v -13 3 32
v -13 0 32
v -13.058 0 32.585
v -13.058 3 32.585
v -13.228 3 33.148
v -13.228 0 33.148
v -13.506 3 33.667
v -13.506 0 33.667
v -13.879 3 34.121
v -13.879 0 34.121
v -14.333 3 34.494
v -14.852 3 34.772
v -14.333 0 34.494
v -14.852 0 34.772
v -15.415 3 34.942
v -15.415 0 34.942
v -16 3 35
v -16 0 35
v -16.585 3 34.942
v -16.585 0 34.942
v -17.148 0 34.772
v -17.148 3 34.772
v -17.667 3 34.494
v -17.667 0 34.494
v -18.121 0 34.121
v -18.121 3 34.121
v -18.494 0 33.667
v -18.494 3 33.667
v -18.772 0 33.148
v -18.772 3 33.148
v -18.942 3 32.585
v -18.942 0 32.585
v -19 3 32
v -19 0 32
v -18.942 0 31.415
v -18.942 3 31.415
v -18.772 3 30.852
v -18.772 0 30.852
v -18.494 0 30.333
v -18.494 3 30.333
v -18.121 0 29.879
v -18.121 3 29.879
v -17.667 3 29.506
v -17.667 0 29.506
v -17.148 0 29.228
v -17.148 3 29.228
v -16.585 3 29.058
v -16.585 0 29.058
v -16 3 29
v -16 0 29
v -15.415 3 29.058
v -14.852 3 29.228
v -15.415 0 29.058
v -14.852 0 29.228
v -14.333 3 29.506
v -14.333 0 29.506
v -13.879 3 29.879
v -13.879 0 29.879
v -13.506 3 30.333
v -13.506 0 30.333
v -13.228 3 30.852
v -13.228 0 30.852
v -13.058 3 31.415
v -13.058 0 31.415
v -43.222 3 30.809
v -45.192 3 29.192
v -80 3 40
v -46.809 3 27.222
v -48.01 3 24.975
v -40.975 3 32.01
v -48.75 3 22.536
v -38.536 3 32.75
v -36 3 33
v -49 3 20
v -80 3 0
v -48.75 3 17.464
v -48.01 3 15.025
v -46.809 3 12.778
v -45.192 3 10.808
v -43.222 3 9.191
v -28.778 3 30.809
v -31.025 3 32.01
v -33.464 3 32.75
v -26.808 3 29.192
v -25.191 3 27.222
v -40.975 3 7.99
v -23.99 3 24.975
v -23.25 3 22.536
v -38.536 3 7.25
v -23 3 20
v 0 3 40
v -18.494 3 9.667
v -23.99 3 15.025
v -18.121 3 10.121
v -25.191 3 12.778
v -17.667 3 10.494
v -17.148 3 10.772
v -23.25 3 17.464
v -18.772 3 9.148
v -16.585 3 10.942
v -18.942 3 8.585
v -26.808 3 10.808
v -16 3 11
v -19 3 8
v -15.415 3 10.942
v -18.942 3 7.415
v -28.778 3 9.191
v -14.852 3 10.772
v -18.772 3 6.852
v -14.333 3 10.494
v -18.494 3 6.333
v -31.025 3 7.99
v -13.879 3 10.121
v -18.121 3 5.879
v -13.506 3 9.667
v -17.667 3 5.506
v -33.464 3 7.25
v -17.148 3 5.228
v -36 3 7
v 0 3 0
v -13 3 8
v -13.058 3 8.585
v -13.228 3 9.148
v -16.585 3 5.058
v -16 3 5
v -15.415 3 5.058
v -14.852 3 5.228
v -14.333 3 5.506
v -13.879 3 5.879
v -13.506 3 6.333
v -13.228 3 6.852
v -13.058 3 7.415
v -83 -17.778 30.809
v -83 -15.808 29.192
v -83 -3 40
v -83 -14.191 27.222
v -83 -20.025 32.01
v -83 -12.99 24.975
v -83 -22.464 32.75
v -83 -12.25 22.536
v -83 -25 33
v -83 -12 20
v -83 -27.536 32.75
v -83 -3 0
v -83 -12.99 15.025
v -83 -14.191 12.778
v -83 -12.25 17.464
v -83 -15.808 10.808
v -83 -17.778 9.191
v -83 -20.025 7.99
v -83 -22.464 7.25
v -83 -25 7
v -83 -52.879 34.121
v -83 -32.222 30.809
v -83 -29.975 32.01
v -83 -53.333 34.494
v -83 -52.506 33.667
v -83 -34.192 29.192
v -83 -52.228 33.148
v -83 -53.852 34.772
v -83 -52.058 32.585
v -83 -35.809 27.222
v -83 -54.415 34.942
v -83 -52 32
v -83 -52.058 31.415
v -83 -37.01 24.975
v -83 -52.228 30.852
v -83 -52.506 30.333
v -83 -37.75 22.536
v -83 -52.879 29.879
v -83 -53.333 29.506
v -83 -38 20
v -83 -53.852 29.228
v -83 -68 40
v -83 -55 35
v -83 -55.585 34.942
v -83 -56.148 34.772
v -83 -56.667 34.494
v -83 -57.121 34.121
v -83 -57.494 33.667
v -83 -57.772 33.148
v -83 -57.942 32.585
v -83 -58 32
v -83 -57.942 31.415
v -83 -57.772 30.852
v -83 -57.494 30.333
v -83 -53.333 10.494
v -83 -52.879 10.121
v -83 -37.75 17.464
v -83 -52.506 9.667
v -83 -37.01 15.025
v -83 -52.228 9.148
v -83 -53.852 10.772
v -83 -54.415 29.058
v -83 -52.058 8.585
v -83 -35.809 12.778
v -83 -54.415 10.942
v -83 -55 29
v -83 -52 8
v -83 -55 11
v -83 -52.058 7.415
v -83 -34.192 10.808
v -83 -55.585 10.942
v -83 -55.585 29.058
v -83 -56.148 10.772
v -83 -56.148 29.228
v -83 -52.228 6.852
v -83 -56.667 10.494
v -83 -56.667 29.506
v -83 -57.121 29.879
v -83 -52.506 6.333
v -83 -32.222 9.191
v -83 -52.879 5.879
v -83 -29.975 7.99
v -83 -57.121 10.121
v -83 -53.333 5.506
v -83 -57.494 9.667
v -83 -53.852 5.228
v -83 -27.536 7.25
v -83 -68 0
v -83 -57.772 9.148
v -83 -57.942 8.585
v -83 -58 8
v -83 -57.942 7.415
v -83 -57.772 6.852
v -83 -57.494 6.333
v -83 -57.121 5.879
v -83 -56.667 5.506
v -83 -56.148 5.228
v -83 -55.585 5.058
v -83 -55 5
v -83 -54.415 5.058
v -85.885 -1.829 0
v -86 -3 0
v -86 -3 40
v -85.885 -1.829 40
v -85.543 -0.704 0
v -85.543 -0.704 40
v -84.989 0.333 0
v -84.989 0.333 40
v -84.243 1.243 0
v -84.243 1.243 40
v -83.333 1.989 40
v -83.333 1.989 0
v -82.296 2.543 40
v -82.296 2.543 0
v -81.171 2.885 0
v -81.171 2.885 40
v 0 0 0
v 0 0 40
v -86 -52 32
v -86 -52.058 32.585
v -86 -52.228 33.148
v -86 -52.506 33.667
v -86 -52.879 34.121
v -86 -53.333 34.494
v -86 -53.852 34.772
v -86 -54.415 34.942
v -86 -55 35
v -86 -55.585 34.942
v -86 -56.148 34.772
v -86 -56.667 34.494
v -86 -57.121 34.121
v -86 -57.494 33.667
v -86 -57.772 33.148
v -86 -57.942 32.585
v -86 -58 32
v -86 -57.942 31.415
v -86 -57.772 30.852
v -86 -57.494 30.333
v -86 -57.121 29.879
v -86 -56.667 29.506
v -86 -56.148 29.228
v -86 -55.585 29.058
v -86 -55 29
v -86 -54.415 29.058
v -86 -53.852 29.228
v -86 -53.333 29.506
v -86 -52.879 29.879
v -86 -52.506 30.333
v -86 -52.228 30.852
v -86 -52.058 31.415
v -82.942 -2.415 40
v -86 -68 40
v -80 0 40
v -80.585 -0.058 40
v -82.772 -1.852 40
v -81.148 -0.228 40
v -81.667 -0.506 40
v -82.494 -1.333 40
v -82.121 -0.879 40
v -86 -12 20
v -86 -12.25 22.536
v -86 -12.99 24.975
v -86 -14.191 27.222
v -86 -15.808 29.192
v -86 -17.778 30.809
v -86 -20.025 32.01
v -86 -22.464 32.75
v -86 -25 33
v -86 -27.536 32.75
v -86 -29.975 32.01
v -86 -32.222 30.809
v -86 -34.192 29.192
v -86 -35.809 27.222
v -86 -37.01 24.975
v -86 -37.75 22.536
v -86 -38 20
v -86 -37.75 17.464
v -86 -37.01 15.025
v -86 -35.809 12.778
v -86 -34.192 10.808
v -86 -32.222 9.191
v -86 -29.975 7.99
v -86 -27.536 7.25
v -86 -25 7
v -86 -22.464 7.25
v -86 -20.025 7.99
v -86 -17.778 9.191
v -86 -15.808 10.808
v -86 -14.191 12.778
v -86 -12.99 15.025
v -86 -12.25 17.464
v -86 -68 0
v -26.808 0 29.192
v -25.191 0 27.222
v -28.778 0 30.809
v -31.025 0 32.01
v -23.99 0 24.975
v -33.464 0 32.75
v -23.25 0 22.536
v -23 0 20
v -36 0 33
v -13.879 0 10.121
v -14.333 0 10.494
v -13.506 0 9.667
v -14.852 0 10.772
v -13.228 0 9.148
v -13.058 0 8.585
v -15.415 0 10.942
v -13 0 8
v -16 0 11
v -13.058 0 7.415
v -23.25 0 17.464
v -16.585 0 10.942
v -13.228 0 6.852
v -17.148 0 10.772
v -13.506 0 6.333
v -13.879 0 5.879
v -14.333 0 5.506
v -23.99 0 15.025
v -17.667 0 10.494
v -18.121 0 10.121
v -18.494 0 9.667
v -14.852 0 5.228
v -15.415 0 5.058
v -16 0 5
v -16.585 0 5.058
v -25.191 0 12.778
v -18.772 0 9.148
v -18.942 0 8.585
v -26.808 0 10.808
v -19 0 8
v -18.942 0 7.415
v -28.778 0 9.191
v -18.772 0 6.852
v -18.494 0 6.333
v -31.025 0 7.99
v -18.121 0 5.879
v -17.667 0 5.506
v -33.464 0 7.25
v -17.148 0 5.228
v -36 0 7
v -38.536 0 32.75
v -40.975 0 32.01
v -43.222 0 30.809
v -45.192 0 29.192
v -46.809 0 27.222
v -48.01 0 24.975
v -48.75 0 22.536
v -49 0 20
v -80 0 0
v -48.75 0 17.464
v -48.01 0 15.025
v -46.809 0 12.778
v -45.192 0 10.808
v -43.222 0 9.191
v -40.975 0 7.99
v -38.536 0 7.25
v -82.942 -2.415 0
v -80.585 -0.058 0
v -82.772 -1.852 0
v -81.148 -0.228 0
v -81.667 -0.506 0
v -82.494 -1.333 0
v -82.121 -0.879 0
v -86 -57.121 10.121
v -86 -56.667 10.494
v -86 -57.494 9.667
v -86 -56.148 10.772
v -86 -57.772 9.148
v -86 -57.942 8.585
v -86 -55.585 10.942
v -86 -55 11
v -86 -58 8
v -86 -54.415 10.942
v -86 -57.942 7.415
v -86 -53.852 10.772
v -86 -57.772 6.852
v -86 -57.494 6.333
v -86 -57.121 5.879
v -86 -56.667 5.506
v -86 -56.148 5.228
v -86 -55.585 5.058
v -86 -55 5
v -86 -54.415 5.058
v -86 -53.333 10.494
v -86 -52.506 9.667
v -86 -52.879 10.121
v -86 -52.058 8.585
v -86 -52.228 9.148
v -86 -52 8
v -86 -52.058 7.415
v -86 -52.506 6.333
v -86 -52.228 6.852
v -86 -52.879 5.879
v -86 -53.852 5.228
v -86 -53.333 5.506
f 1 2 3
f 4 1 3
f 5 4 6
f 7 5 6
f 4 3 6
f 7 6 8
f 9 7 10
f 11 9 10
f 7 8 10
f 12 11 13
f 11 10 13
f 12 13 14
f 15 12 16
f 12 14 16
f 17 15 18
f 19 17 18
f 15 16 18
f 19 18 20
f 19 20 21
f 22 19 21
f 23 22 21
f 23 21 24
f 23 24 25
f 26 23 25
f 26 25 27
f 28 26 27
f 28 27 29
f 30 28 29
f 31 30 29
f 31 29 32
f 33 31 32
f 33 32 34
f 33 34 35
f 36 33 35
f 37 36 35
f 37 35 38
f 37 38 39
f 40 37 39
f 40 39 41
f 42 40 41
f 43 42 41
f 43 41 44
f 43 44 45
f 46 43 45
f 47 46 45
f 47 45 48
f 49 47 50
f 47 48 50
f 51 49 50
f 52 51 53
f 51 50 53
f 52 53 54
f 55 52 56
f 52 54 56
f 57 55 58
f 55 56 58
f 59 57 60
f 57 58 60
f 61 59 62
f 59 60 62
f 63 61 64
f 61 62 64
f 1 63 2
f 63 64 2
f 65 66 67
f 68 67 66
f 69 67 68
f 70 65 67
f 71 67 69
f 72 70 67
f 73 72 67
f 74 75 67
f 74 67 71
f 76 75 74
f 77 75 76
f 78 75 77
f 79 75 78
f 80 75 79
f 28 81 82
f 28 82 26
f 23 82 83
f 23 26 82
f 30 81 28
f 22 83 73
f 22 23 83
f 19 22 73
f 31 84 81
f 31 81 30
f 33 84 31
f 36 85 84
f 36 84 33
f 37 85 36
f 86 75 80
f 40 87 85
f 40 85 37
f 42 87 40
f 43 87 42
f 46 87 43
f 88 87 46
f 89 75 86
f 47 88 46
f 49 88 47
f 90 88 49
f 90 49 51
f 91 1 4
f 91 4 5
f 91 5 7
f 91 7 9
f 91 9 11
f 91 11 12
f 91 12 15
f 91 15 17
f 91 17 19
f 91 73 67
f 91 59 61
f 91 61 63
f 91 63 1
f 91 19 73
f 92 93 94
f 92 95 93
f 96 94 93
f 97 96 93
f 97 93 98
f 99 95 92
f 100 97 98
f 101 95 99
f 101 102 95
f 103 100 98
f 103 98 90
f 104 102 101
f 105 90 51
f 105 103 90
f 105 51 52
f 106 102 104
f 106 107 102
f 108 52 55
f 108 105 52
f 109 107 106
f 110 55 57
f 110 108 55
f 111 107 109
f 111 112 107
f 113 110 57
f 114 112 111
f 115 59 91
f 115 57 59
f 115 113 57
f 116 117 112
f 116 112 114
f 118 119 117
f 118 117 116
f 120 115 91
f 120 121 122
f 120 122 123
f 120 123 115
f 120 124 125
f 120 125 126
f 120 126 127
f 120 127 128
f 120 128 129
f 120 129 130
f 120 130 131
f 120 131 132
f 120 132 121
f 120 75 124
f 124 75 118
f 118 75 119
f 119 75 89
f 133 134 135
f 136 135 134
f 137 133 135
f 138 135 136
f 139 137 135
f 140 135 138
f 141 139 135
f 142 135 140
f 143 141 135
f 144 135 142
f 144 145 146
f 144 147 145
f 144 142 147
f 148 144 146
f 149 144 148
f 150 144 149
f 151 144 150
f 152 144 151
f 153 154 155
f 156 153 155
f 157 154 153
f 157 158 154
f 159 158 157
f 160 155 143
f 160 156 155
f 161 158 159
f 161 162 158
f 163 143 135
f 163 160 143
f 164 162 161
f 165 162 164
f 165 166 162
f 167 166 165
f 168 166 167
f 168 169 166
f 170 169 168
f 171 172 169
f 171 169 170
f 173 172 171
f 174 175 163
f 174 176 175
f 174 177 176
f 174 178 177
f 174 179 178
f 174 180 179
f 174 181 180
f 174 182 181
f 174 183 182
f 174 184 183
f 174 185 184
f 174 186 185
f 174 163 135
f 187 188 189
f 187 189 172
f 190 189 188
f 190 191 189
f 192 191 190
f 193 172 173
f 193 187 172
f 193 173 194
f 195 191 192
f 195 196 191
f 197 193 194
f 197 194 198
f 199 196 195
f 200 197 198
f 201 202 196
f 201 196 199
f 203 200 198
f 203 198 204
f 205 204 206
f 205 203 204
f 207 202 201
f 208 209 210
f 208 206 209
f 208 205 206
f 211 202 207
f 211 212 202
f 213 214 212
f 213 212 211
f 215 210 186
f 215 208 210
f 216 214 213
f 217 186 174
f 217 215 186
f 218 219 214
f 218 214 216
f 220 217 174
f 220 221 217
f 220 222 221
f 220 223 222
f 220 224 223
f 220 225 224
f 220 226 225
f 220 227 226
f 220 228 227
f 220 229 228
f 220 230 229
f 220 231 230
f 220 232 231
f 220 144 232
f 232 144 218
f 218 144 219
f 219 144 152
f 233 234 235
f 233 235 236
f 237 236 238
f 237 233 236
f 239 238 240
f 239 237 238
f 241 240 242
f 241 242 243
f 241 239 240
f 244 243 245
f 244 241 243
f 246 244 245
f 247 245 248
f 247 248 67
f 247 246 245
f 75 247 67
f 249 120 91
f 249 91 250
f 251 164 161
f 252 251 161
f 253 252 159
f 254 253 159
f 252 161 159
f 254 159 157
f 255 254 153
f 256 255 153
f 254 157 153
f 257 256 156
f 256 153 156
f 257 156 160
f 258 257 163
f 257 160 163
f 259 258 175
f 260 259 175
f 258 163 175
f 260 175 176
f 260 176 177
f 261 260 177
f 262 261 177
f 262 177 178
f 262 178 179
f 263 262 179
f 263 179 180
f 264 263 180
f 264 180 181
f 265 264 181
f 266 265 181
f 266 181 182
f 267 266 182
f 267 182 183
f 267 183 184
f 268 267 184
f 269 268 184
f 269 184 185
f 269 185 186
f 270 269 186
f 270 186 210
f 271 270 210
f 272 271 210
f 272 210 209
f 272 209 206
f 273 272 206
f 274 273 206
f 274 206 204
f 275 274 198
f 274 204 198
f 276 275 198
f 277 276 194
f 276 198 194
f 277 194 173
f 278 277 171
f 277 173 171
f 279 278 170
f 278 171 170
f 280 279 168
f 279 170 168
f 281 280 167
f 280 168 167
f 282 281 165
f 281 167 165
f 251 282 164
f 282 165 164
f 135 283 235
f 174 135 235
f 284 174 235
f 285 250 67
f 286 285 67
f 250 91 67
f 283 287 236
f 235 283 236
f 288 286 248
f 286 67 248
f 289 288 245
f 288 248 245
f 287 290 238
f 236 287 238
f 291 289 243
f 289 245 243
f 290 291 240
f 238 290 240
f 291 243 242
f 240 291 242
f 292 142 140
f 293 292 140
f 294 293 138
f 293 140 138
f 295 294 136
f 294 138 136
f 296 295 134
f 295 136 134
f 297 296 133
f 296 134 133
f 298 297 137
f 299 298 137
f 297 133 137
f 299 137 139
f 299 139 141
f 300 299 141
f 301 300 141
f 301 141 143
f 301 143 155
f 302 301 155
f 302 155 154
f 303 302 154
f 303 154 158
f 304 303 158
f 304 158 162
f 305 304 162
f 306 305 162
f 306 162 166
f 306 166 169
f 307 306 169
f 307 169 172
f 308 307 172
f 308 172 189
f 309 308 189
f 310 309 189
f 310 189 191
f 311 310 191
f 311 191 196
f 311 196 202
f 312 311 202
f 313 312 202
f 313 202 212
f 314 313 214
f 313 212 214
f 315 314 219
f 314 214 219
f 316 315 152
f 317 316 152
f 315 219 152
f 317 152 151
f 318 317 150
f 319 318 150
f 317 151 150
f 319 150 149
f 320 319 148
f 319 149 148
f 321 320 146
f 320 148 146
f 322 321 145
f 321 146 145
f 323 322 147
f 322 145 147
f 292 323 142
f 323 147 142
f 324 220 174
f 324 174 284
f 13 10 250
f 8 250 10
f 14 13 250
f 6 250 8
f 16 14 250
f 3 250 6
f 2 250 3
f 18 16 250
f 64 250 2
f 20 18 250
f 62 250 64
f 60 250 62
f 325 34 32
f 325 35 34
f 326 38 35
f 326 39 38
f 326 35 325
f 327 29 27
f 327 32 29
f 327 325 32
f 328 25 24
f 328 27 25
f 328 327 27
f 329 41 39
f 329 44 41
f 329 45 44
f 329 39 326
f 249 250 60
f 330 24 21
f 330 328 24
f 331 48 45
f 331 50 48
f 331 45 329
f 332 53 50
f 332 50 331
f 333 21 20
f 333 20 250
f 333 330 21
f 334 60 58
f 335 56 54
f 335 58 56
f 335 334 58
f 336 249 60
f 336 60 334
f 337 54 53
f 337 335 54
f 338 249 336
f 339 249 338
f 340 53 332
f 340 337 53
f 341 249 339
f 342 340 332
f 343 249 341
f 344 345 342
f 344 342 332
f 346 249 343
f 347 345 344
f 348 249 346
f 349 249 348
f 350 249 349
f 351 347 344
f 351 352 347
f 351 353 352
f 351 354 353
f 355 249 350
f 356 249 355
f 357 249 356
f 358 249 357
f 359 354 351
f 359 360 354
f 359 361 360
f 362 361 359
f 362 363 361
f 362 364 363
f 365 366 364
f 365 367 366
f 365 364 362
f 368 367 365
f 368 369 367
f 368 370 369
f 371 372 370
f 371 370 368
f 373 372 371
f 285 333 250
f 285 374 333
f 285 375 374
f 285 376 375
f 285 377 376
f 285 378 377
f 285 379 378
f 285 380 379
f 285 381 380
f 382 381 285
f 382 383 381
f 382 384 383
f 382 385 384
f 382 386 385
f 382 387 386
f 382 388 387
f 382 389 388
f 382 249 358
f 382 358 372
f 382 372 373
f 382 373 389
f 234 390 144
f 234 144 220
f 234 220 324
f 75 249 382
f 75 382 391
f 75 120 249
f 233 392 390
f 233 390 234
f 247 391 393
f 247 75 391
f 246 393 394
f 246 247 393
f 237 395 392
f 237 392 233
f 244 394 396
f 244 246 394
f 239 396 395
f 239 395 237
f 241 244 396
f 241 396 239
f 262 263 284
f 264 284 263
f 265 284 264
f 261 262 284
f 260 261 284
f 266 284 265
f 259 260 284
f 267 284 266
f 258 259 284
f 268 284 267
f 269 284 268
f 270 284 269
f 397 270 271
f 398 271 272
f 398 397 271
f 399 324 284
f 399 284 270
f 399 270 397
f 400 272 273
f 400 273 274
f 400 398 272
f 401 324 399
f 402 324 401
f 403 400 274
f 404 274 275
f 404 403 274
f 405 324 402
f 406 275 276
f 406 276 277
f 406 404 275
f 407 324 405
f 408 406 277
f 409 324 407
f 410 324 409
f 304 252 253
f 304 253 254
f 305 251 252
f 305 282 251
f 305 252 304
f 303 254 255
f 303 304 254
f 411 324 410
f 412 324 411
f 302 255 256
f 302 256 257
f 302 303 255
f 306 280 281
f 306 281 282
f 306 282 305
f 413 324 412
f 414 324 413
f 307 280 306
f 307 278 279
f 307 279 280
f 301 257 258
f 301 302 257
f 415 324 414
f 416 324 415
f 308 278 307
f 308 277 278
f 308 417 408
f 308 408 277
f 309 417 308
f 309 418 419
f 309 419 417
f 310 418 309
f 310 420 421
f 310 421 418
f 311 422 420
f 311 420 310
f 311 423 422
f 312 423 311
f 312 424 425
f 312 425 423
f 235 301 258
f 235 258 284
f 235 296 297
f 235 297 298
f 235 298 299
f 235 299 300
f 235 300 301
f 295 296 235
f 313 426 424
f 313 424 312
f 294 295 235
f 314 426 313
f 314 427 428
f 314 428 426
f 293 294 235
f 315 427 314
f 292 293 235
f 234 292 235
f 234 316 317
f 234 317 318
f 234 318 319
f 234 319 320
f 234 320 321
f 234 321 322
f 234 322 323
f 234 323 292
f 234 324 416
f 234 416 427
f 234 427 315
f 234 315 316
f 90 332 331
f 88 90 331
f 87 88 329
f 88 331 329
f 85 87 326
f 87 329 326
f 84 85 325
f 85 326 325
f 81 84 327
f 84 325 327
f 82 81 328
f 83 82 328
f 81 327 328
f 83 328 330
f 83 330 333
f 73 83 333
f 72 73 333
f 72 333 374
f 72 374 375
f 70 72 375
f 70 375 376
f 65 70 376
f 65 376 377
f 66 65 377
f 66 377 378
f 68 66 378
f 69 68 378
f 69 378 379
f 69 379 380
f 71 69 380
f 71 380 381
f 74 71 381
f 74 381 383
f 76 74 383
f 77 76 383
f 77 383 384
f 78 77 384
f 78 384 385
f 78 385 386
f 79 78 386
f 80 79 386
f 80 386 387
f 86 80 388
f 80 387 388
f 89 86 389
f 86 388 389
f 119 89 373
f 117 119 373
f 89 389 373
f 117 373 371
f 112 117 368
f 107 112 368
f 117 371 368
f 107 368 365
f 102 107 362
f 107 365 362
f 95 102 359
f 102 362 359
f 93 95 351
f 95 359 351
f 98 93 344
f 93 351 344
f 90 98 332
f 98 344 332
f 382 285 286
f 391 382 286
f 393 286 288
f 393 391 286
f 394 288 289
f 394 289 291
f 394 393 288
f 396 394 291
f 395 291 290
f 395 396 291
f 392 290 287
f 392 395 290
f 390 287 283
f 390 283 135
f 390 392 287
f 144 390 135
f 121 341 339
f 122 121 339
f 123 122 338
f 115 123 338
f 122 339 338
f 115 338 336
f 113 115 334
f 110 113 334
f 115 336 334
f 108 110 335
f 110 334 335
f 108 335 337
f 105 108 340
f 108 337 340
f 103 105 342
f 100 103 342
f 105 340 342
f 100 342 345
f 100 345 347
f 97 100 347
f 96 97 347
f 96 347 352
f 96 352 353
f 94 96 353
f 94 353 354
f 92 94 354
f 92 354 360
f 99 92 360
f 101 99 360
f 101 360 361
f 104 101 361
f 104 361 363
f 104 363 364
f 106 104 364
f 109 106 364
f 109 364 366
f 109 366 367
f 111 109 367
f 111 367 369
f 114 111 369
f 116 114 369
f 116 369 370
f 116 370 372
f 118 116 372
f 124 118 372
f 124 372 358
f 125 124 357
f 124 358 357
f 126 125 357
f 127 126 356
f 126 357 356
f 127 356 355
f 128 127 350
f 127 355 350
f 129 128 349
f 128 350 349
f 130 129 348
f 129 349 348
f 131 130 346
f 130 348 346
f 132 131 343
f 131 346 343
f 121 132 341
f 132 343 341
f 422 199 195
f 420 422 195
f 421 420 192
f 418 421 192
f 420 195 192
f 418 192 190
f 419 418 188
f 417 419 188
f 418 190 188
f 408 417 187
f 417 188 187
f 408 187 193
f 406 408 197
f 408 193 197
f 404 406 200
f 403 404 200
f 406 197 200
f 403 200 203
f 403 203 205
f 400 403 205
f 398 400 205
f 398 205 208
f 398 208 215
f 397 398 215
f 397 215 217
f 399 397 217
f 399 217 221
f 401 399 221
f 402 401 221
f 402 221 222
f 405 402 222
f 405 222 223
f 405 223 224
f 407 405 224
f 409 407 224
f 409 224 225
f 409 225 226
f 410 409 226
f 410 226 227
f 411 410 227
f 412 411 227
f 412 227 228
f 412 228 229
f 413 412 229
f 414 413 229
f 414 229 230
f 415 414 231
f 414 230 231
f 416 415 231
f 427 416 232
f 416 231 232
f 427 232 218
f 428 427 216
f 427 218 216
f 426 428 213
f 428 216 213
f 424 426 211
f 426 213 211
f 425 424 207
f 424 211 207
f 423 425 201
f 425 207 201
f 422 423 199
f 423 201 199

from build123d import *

# Parameters (mm, degrees)
BASE_FLANGE1_DEPTH = 40
SKETCH2_R          = 13
CUT_EXTRUDE1_DEPTH = 115.512008104
SKETCH3_R          = 13
CUT_EXTRUDE2_DEPTH = 117.704755687
SKETCH4_R          = 3
CUT_EXTRUDE3_DEPTH = 10
SKETCH5_R          = 3
CUT_EXTRUDE4_DEPTH = 10


# Sheet-metal steps are written as plain solids
with BuildPart() as part:
    # Sketch1 → Base-Flange1 (new body)
    with BuildSketch(Plane.XY):
        with BuildLine():
            Line((0, 0), (-80, 0))
            ThreePointArc((-80, 0), (-82.121320344, -0.878679656), (-83, -3))
            Line((-83, -3), (-83, -68))
            Line((-83, -68), (-86, -68))
            Line((-86, -68), (-86, -3))
            ThreePointArc((-86, -3), (-84.242640687, 1.242640687), (-80, 3))
            Line((-80, 3), (0, 3))
            Line((0, 3), (0, 0))
        make_face()
    extrude(amount=BASE_FLANGE1_DEPTH)

    # Sketch2 → Cut-Extrude1 (cut, through all)
    with BuildSketch(Plane(origin=(-83, 0, 0), x_dir=(0, 0, -1), z_dir=(1, 0, 0))):
        with Locations(Location((-20, -25, 0), (0, 0, 90))):
            Circle(SKETCH2_R)
    extrude(amount=-CUT_EXTRUDE1_DEPTH, mode=Mode.SUBTRACT)

    # Sketch3 → Cut-Extrude2 (cut, through all)
    with BuildSketch(Plane.XZ):
        with Locations((-36, 20)):
            Circle(SKETCH3_R)
    extrude(amount=-CUT_EXTRUDE2_DEPTH, mode=Mode.SUBTRACT)

    # Sketch4 → Cut-Extrude3 (cut)
    with BuildSketch(Plane(origin=(0, 0, 0), x_dir=(-1, 0, 0), z_dir=(0, -1, 0))):
        with Locations(Location((16, -32, 0), (0, 0, 180))):
            Circle(SKETCH4_R)
        with Locations(Location((16, -8, 0), (0, 0, 180))):
            Circle(SKETCH4_R)
    extrude(amount=-CUT_EXTRUDE3_DEPTH, mode=Mode.SUBTRACT)

    # Sketch5 → Cut-Extrude4 (cut)
    with BuildSketch(Plane(origin=(-83, 0, 0), x_dir=(0, 0, -1), z_dir=(1, 0, 0))):
        with Locations(Location((-32, -55, 0), (0, 0, 90))):
            Circle(SKETCH5_R)
        with Locations(Location((-8, -55, 0), (0, 0, 90))):
            Circle(SKETCH5_R)
    extrude(amount=-CUT_EXTRUDE4_DEPTH, mode=Mode.SUBTRACT)


solid = part.part
